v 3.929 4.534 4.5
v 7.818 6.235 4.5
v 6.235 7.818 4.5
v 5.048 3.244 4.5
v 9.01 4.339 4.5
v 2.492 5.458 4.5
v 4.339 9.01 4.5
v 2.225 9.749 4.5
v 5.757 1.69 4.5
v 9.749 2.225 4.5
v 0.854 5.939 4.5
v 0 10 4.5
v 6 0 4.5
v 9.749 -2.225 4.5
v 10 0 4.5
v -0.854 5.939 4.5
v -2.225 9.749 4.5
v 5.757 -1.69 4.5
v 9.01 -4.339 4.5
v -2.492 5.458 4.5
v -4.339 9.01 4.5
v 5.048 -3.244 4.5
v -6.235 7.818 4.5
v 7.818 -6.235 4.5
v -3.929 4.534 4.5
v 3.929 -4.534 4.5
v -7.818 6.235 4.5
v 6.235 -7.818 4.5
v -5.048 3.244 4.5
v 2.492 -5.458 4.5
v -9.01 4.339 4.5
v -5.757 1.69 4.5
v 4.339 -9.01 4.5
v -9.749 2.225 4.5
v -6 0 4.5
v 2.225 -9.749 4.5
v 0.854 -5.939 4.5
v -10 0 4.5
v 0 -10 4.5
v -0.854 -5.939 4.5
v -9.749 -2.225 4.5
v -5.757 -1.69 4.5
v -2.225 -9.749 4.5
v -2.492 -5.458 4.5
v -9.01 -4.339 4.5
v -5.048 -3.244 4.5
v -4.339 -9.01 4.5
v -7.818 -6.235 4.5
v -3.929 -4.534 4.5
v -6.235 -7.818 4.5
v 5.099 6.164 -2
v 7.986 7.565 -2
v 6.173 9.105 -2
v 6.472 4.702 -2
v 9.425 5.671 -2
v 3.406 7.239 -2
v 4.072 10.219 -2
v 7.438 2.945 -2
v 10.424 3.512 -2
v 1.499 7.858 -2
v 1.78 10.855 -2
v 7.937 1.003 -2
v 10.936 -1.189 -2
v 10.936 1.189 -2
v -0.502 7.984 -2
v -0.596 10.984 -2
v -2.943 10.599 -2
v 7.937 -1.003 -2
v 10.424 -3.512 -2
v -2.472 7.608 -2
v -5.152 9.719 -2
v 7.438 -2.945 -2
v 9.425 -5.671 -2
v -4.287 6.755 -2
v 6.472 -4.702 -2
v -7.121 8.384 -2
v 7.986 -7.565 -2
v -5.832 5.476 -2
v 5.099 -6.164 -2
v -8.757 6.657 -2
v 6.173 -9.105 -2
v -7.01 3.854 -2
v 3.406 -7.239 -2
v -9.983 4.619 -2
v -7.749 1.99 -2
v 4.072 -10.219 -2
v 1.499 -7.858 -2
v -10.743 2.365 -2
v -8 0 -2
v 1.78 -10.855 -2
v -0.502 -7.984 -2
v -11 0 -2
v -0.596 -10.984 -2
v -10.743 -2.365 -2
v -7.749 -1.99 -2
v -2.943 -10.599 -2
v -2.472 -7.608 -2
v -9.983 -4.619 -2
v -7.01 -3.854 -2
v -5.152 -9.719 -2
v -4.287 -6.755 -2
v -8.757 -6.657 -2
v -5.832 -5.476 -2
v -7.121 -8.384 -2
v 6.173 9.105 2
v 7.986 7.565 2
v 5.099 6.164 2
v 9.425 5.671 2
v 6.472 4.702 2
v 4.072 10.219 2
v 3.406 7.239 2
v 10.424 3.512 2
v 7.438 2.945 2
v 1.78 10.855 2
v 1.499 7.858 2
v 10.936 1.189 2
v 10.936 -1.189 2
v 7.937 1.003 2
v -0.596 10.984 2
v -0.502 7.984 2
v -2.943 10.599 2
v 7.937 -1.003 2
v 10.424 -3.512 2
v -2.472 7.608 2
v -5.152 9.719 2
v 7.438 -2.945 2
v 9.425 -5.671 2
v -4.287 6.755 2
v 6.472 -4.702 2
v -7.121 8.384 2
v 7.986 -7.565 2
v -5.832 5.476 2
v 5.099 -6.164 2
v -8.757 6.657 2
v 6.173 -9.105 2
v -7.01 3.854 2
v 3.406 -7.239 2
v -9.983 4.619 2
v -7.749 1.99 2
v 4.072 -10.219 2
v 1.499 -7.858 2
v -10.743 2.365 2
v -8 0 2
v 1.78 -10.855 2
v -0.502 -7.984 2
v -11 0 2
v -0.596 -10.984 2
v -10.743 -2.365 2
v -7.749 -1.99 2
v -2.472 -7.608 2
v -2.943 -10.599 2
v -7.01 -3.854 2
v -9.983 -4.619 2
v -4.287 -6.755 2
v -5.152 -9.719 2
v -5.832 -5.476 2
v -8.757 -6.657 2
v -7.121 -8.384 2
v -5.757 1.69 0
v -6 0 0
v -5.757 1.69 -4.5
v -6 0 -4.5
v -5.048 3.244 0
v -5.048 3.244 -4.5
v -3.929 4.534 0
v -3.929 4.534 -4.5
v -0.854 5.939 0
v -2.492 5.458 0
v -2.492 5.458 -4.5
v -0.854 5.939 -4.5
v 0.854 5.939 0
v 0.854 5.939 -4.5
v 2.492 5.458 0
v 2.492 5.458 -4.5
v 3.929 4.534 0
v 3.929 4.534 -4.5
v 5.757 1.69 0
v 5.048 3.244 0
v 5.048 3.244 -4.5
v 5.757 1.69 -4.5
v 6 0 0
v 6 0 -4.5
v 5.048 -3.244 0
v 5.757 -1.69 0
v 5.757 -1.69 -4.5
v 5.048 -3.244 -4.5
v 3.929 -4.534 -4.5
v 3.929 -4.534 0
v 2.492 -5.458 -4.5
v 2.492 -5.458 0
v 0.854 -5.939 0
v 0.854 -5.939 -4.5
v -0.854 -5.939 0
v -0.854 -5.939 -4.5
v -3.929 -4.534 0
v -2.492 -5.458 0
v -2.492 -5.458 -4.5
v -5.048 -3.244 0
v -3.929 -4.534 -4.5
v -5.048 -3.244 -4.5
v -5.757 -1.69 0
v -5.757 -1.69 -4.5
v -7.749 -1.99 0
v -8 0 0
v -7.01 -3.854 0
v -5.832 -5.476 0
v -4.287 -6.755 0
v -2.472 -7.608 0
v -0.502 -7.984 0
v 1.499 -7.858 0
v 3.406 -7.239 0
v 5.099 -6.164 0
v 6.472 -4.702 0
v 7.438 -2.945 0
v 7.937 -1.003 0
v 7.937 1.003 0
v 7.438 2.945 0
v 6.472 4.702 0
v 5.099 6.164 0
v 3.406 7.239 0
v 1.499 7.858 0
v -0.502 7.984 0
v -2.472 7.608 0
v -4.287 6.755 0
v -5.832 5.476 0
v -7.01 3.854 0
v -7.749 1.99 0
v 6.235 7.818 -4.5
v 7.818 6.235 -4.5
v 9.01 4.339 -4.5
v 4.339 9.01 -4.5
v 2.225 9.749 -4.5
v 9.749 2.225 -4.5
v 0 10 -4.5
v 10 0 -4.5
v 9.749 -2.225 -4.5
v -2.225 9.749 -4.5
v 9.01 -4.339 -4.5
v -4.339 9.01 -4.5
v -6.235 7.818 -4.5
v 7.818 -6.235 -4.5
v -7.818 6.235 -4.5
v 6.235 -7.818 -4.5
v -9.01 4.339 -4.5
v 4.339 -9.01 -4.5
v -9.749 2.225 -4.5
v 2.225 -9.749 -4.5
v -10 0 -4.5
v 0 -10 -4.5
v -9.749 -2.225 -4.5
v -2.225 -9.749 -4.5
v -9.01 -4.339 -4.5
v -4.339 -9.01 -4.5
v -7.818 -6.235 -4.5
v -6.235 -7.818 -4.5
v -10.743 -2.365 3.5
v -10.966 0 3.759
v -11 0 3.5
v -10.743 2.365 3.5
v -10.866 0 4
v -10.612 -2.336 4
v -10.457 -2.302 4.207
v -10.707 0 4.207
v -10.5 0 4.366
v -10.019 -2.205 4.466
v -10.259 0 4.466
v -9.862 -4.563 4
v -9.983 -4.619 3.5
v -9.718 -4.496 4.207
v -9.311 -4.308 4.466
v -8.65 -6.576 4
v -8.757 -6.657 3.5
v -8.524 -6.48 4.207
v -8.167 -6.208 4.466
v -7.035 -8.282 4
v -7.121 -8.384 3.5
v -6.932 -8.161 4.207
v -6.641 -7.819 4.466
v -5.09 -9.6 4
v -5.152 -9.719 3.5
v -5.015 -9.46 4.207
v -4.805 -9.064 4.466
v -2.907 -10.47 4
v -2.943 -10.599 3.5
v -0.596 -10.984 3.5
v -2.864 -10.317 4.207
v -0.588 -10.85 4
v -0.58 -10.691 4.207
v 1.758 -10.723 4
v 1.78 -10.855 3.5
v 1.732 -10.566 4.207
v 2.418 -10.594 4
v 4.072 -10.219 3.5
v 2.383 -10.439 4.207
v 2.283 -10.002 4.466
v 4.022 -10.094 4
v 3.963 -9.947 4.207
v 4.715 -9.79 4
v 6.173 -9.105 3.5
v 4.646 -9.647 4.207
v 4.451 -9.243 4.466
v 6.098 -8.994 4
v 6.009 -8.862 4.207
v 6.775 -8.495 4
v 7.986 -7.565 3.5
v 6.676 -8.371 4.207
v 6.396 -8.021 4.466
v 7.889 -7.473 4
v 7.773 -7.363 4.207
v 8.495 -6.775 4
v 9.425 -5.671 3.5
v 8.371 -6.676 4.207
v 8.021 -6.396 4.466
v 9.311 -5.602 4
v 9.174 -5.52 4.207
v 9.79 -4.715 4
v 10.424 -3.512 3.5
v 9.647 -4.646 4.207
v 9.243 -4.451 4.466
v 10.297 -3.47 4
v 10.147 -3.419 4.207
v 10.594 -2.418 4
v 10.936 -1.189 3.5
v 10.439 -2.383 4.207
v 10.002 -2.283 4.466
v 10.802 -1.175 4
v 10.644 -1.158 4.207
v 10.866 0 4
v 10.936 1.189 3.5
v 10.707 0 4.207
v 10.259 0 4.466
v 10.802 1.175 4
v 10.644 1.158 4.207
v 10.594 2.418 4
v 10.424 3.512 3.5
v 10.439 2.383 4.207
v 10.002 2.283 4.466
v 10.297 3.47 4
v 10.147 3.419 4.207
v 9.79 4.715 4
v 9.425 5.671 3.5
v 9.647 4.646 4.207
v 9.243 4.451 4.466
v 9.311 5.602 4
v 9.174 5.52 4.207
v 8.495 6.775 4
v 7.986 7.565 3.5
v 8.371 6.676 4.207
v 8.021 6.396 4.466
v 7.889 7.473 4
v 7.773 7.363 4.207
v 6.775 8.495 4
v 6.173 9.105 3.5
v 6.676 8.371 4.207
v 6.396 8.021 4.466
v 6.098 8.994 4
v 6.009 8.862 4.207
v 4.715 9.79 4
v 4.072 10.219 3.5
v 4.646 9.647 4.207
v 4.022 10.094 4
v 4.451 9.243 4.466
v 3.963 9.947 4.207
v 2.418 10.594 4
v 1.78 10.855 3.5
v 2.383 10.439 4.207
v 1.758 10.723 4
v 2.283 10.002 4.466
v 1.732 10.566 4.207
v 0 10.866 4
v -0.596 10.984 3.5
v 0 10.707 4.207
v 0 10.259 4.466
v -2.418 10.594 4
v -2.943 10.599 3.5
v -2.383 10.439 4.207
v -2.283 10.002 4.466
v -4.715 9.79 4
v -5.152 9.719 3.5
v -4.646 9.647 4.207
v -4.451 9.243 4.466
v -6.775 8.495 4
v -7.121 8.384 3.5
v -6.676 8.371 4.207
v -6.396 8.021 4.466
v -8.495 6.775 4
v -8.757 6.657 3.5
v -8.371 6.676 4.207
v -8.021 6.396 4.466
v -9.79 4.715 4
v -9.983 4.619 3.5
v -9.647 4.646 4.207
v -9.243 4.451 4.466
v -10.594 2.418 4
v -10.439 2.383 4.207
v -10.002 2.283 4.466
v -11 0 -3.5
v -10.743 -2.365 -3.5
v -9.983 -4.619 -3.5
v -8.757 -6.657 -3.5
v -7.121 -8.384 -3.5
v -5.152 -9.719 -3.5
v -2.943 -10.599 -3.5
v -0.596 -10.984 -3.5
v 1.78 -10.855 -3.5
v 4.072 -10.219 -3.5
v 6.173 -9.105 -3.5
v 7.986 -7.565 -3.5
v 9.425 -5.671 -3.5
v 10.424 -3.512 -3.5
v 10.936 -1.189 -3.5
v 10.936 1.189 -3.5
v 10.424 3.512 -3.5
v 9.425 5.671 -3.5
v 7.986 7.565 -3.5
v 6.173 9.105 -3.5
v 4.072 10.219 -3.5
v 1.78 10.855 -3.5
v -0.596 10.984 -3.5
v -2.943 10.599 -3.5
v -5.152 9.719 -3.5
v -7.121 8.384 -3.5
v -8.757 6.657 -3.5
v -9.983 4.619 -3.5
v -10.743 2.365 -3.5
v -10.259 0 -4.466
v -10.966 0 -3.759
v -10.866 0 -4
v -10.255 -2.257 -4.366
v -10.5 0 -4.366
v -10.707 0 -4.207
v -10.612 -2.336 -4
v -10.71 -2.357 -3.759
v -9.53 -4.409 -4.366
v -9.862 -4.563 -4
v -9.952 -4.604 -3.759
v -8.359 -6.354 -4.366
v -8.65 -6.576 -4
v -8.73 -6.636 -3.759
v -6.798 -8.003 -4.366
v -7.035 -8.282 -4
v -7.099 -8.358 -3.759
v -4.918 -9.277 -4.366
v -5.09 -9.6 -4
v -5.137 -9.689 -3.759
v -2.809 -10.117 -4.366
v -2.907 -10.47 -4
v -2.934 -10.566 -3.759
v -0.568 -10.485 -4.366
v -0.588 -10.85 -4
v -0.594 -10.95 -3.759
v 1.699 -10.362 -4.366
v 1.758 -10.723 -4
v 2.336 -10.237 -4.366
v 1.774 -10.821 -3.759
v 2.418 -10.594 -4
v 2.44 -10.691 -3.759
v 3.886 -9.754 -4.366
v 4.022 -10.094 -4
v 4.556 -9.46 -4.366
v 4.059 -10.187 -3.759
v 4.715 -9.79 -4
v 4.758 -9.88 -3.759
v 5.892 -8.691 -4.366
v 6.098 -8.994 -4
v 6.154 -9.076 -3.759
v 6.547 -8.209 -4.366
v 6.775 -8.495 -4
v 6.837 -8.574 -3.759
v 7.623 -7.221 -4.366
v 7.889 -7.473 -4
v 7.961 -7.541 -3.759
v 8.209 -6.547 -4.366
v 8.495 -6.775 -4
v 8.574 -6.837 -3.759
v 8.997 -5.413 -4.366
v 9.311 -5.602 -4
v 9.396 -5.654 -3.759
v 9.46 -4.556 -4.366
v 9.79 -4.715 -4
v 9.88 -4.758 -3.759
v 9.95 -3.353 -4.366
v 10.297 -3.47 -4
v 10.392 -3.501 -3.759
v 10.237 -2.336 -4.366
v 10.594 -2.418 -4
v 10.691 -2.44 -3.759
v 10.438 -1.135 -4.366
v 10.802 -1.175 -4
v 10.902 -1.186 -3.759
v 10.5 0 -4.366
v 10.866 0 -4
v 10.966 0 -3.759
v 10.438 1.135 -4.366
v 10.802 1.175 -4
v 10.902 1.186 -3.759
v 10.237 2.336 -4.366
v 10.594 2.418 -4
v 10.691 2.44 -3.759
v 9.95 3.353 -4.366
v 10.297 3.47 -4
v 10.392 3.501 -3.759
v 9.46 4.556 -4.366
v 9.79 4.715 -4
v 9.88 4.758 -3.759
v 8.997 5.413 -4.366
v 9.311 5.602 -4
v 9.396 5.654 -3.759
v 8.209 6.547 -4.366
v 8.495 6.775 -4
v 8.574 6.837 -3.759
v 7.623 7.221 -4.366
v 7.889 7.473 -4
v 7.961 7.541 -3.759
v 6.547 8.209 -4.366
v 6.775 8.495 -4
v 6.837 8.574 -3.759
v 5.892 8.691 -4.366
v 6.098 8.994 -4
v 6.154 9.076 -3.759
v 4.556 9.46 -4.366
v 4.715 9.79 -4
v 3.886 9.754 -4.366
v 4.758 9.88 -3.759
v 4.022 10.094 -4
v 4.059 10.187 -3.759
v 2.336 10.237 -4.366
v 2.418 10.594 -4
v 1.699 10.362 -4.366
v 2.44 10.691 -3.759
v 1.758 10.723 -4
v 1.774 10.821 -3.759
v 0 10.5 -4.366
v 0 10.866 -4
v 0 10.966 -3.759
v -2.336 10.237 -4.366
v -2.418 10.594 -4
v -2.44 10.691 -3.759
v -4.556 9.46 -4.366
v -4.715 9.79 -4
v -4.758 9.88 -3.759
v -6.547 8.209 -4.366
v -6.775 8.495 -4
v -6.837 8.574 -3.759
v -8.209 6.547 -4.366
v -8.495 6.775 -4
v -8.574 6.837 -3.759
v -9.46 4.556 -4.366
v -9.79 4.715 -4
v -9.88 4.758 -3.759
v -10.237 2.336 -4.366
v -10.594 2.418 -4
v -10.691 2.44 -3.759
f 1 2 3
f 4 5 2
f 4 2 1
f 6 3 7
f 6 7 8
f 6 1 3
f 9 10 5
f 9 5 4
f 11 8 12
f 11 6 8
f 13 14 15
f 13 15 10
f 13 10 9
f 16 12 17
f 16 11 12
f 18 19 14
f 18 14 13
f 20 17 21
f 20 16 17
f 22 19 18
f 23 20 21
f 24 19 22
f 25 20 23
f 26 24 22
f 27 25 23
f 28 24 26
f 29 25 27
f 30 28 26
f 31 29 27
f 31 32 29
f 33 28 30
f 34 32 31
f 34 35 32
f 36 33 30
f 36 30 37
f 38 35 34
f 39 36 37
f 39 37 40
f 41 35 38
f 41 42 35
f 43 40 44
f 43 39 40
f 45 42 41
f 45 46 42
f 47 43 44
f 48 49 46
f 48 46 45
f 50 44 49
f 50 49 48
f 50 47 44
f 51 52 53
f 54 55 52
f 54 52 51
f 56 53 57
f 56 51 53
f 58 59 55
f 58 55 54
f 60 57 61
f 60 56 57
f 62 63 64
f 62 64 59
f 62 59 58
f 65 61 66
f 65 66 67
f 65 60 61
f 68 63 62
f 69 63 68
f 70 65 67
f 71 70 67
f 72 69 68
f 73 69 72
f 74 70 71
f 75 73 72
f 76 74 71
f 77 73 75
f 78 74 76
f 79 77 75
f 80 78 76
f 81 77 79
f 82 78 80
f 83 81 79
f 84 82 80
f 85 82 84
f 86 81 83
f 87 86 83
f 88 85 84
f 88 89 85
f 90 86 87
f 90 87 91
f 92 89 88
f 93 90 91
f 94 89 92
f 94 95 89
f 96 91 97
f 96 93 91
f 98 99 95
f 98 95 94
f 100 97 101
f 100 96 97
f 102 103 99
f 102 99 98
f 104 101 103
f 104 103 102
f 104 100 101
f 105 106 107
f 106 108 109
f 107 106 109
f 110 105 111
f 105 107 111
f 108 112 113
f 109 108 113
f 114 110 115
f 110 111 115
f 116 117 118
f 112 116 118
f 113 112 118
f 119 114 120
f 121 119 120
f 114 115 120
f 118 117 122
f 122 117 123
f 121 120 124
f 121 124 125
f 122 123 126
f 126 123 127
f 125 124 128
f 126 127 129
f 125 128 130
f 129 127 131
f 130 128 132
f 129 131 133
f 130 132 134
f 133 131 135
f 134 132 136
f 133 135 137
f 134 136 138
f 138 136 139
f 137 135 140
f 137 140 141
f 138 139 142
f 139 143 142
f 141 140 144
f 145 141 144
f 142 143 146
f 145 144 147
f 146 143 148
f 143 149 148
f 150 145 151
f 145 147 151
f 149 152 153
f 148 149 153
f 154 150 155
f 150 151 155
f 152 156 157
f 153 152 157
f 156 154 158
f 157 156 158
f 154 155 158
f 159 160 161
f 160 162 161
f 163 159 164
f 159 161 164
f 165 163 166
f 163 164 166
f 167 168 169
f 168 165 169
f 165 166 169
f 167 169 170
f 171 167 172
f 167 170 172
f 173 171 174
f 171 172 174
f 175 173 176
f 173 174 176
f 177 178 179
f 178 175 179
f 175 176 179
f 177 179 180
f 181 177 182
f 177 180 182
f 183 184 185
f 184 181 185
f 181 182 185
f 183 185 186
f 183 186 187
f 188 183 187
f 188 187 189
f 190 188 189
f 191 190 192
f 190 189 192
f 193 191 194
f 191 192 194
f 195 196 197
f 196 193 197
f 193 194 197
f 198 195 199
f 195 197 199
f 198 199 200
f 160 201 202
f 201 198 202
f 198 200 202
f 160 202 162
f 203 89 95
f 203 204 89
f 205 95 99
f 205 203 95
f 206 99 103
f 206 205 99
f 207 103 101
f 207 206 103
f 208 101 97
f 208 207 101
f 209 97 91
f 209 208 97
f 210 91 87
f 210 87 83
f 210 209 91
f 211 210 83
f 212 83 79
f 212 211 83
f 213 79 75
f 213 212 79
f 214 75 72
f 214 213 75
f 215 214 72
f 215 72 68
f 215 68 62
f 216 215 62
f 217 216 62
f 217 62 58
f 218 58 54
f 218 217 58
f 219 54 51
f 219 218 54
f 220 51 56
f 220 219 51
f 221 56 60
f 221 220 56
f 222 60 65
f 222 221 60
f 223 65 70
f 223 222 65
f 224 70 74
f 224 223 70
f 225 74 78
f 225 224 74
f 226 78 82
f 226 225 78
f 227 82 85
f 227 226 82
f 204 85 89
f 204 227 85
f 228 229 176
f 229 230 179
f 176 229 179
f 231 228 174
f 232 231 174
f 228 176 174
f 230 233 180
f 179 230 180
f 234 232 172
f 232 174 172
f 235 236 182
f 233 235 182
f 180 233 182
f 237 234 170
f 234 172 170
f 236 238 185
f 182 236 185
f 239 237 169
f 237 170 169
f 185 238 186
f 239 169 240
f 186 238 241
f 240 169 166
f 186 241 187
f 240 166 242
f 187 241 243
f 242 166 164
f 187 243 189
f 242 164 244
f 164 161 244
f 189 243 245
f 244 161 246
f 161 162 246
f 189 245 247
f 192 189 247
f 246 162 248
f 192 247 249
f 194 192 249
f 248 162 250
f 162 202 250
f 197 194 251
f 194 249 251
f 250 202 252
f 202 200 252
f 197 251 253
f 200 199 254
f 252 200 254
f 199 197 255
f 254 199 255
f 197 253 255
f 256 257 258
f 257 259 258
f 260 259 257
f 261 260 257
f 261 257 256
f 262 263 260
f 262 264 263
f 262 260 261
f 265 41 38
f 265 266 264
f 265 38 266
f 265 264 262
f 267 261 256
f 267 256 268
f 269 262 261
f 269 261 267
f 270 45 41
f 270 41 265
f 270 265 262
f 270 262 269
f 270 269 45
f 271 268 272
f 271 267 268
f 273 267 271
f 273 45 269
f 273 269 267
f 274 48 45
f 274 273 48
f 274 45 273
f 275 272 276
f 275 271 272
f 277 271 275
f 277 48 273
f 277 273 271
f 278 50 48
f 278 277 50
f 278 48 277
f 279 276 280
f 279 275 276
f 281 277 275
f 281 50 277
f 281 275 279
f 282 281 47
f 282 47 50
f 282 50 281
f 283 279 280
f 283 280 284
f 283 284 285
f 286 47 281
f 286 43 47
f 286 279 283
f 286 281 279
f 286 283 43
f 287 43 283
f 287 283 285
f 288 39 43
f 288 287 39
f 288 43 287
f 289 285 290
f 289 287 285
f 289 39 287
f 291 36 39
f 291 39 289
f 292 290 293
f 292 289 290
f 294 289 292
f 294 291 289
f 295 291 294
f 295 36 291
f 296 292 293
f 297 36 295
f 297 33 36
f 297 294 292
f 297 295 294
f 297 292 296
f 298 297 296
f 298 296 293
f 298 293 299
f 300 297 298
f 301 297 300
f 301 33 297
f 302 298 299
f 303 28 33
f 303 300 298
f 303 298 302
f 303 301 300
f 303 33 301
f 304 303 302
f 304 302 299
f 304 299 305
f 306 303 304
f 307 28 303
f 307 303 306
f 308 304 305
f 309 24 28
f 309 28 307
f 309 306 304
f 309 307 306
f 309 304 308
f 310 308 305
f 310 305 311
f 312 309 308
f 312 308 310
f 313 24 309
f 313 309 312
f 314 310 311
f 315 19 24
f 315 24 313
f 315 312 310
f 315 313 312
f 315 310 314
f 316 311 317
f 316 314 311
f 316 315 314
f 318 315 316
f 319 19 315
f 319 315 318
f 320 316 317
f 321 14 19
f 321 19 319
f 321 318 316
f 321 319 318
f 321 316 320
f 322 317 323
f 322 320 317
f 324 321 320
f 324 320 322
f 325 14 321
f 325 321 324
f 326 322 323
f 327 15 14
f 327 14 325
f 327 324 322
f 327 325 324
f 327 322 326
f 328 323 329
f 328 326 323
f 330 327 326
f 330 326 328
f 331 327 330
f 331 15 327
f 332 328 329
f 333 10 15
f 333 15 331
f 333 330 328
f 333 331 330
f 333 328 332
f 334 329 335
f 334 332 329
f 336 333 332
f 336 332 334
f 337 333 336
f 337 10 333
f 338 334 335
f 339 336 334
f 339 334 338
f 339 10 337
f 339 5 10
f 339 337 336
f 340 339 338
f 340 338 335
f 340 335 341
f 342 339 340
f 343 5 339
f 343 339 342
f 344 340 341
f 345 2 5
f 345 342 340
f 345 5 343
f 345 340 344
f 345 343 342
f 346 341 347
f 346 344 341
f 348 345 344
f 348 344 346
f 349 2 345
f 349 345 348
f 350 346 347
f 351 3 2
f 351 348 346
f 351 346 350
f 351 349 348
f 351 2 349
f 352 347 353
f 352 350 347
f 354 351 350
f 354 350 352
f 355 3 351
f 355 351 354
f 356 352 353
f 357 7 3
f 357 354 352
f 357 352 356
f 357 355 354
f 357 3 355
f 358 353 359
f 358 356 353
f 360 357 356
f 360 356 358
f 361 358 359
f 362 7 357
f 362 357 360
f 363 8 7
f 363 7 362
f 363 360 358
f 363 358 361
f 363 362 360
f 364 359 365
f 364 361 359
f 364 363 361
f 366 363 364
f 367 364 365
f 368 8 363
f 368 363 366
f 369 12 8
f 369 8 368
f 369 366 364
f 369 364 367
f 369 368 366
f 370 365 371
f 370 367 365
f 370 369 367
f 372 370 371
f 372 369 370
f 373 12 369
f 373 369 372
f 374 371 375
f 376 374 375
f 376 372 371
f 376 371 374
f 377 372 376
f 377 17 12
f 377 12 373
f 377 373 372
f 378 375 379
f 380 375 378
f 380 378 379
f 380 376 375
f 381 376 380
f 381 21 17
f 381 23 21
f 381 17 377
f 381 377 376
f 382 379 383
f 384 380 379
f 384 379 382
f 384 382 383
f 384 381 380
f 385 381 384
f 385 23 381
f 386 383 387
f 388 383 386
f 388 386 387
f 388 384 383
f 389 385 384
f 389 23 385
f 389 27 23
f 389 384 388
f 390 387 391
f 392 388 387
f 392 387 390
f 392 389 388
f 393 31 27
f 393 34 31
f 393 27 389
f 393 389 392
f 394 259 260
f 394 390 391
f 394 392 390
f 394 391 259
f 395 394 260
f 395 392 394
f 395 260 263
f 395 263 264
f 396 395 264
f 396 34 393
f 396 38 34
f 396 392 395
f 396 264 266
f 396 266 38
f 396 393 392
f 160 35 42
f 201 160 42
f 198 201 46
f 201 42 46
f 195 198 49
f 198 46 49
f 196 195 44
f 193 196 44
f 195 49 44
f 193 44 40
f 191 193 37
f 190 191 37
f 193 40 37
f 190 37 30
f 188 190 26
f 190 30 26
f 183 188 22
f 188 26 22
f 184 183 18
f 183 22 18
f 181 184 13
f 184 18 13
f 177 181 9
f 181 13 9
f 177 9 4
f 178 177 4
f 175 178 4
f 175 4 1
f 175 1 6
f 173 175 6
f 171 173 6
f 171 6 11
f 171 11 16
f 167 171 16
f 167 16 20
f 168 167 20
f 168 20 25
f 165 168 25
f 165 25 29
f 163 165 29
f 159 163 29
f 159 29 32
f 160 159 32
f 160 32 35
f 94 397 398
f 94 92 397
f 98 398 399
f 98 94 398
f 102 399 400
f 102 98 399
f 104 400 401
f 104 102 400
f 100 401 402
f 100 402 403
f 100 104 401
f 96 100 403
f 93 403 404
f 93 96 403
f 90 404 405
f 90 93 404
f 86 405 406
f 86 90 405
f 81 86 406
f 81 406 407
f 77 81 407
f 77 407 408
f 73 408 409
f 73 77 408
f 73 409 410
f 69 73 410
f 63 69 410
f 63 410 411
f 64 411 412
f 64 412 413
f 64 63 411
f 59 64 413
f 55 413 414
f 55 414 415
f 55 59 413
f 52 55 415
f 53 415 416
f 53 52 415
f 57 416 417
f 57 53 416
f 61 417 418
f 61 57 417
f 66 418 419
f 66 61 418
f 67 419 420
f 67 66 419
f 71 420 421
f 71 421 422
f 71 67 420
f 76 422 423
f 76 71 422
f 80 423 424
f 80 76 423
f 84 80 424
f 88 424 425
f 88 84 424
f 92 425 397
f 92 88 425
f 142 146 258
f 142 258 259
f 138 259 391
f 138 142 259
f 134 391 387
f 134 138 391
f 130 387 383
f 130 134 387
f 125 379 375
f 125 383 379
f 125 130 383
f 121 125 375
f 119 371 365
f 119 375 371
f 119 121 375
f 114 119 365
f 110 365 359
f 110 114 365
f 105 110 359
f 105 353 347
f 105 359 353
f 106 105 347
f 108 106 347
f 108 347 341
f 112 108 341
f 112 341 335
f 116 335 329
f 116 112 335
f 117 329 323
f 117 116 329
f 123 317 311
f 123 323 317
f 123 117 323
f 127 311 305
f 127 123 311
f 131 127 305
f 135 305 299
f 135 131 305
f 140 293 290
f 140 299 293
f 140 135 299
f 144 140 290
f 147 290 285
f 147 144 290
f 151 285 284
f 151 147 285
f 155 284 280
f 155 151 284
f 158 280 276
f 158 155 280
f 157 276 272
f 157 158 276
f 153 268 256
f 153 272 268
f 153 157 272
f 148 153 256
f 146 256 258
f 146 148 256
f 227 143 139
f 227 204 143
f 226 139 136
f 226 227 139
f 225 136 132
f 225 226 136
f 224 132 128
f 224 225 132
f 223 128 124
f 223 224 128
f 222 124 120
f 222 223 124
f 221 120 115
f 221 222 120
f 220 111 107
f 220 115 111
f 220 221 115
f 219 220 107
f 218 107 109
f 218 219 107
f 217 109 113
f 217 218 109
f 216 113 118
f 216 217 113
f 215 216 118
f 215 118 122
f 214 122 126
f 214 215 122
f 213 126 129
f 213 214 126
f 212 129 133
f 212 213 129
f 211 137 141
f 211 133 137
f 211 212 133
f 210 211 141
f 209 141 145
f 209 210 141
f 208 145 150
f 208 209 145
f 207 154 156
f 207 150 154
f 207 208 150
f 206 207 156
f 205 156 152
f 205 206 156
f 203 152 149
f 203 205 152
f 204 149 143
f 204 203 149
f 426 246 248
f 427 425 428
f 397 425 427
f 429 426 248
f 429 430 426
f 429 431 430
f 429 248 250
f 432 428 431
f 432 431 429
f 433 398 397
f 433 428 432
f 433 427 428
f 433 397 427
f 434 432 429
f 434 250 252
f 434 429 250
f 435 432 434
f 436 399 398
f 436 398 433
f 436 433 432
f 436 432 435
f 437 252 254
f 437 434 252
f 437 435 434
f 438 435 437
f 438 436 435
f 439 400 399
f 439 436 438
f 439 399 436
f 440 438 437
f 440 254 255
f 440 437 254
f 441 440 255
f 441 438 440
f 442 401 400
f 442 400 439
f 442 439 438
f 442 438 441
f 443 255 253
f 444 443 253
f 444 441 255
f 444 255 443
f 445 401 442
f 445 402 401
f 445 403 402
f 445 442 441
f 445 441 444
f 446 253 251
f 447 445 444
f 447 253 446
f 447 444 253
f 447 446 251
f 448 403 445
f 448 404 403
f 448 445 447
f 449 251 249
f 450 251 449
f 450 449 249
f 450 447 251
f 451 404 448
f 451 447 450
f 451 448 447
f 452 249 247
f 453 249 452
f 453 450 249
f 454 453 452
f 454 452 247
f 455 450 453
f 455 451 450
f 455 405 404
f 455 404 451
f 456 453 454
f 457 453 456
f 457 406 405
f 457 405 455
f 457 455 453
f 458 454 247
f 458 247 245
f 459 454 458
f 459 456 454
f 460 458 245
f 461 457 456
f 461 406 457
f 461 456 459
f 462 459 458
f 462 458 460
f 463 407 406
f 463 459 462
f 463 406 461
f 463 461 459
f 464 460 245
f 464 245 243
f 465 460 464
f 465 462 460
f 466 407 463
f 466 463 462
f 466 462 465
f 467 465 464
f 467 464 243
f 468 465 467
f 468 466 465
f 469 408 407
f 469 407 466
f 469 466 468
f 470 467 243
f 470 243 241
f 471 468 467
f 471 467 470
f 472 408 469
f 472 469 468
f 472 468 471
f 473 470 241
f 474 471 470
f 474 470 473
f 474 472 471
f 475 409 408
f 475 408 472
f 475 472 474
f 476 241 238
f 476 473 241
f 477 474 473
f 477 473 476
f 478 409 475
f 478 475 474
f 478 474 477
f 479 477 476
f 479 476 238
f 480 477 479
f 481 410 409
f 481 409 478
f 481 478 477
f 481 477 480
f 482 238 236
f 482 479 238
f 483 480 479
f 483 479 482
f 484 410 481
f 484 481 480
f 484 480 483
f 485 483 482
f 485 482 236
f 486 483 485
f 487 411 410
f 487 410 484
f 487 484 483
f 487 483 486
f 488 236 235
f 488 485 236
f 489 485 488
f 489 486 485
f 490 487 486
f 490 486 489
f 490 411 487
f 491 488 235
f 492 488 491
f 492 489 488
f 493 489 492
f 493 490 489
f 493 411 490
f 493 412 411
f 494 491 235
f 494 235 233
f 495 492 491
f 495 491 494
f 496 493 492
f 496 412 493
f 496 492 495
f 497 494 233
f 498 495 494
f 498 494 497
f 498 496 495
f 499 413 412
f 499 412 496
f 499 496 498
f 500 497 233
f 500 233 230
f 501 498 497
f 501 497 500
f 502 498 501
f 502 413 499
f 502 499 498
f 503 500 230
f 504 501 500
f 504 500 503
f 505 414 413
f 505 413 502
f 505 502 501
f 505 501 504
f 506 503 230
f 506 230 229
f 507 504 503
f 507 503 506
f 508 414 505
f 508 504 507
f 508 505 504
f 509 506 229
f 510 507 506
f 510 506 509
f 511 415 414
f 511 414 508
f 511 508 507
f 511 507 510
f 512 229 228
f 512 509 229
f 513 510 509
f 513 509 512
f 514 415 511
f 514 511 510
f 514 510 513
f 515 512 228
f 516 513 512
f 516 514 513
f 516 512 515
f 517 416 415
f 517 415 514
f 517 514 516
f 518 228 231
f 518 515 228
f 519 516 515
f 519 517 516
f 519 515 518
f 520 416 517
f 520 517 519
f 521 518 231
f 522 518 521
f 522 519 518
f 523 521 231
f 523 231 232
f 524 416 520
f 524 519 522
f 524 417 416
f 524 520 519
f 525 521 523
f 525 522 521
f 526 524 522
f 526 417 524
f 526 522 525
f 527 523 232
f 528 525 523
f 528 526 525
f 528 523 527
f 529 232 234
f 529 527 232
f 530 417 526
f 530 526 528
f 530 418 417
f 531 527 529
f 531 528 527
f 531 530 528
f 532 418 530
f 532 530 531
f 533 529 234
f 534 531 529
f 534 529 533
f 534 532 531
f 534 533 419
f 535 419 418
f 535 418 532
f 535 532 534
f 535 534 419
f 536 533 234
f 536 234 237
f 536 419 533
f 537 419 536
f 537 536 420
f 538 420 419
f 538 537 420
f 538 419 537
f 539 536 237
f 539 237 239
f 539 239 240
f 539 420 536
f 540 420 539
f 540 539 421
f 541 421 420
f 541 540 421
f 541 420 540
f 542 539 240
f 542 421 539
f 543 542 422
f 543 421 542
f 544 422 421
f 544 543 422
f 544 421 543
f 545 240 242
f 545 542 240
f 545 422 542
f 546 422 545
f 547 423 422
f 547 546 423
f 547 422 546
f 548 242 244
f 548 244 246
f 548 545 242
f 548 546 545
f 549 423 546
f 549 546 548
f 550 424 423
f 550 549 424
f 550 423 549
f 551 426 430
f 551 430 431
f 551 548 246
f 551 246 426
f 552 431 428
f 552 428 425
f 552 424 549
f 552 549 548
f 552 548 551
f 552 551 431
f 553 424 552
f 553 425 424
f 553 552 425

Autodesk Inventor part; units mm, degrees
ref_plane "YZ Plane" through (0, 0, 0) normal (1, 0, 0) x (0, 1, 0)
ref_plane "XZ Plane" through (0, 0, 0) normal (0, 1, 0) x (-1, 0, 0)
ref_plane "XY Plane" through (0, 0, 0) normal (0, 0, 1) x (1, 0, 0)
sketch "Sketch1" plane through (0, 0, 0) normal (0, 1, 0) x (-1, 0, 0)
  line L0 (0, 0) -> (6, 0) construction
  line L1 (6, 0) -> (11, 0) construction
  line L2 (6, 0) -> (6, -4.5)
  line L3 (6, -4.5) -> (10, -4.5)
  line L4 (11, -3.5) -> (11, -2)
  line L5 (11, -2) -> (8, -2)
  line L6 (8, -2) -> (8, 0)
  arc A0 (10, -4.5) -> (11, -3.5) centre (10, -3.5) ccw
  line L7 (6, 0) -> (6, 4.5)
  line L8 (6, 4.5) -> (10, 4.5)
  line L9 (11, 3.5) -> (11, 2)
  line L10 (11, 2) -> (8, 2)
  line L11 (8, 2) -> (8, 0)
  arc A1 (11, 3.5) -> (10, 4.5) centre (10, 3.5) ccw
  line L12 (0, -6.5899) -> (0, 6.5899) projected
  point P0 (11, -4.5)
  point P1 (11, 4.5)
  dimension "d0" = 6
  dimension "d1" = 5
  dimension "d2" = 4.5
  dimension "d3" = 5
  dimension "d4" = 2.5
  dimension "d5" = 3
  dimension "d6" = 1
revolve "Revolution1" add sketch "Sketch1" angle 360 about axis through (0, 0, -10) along (0, 0, 1)
properties part number "Tarot_12mm_Rubber" material "Rubber"
